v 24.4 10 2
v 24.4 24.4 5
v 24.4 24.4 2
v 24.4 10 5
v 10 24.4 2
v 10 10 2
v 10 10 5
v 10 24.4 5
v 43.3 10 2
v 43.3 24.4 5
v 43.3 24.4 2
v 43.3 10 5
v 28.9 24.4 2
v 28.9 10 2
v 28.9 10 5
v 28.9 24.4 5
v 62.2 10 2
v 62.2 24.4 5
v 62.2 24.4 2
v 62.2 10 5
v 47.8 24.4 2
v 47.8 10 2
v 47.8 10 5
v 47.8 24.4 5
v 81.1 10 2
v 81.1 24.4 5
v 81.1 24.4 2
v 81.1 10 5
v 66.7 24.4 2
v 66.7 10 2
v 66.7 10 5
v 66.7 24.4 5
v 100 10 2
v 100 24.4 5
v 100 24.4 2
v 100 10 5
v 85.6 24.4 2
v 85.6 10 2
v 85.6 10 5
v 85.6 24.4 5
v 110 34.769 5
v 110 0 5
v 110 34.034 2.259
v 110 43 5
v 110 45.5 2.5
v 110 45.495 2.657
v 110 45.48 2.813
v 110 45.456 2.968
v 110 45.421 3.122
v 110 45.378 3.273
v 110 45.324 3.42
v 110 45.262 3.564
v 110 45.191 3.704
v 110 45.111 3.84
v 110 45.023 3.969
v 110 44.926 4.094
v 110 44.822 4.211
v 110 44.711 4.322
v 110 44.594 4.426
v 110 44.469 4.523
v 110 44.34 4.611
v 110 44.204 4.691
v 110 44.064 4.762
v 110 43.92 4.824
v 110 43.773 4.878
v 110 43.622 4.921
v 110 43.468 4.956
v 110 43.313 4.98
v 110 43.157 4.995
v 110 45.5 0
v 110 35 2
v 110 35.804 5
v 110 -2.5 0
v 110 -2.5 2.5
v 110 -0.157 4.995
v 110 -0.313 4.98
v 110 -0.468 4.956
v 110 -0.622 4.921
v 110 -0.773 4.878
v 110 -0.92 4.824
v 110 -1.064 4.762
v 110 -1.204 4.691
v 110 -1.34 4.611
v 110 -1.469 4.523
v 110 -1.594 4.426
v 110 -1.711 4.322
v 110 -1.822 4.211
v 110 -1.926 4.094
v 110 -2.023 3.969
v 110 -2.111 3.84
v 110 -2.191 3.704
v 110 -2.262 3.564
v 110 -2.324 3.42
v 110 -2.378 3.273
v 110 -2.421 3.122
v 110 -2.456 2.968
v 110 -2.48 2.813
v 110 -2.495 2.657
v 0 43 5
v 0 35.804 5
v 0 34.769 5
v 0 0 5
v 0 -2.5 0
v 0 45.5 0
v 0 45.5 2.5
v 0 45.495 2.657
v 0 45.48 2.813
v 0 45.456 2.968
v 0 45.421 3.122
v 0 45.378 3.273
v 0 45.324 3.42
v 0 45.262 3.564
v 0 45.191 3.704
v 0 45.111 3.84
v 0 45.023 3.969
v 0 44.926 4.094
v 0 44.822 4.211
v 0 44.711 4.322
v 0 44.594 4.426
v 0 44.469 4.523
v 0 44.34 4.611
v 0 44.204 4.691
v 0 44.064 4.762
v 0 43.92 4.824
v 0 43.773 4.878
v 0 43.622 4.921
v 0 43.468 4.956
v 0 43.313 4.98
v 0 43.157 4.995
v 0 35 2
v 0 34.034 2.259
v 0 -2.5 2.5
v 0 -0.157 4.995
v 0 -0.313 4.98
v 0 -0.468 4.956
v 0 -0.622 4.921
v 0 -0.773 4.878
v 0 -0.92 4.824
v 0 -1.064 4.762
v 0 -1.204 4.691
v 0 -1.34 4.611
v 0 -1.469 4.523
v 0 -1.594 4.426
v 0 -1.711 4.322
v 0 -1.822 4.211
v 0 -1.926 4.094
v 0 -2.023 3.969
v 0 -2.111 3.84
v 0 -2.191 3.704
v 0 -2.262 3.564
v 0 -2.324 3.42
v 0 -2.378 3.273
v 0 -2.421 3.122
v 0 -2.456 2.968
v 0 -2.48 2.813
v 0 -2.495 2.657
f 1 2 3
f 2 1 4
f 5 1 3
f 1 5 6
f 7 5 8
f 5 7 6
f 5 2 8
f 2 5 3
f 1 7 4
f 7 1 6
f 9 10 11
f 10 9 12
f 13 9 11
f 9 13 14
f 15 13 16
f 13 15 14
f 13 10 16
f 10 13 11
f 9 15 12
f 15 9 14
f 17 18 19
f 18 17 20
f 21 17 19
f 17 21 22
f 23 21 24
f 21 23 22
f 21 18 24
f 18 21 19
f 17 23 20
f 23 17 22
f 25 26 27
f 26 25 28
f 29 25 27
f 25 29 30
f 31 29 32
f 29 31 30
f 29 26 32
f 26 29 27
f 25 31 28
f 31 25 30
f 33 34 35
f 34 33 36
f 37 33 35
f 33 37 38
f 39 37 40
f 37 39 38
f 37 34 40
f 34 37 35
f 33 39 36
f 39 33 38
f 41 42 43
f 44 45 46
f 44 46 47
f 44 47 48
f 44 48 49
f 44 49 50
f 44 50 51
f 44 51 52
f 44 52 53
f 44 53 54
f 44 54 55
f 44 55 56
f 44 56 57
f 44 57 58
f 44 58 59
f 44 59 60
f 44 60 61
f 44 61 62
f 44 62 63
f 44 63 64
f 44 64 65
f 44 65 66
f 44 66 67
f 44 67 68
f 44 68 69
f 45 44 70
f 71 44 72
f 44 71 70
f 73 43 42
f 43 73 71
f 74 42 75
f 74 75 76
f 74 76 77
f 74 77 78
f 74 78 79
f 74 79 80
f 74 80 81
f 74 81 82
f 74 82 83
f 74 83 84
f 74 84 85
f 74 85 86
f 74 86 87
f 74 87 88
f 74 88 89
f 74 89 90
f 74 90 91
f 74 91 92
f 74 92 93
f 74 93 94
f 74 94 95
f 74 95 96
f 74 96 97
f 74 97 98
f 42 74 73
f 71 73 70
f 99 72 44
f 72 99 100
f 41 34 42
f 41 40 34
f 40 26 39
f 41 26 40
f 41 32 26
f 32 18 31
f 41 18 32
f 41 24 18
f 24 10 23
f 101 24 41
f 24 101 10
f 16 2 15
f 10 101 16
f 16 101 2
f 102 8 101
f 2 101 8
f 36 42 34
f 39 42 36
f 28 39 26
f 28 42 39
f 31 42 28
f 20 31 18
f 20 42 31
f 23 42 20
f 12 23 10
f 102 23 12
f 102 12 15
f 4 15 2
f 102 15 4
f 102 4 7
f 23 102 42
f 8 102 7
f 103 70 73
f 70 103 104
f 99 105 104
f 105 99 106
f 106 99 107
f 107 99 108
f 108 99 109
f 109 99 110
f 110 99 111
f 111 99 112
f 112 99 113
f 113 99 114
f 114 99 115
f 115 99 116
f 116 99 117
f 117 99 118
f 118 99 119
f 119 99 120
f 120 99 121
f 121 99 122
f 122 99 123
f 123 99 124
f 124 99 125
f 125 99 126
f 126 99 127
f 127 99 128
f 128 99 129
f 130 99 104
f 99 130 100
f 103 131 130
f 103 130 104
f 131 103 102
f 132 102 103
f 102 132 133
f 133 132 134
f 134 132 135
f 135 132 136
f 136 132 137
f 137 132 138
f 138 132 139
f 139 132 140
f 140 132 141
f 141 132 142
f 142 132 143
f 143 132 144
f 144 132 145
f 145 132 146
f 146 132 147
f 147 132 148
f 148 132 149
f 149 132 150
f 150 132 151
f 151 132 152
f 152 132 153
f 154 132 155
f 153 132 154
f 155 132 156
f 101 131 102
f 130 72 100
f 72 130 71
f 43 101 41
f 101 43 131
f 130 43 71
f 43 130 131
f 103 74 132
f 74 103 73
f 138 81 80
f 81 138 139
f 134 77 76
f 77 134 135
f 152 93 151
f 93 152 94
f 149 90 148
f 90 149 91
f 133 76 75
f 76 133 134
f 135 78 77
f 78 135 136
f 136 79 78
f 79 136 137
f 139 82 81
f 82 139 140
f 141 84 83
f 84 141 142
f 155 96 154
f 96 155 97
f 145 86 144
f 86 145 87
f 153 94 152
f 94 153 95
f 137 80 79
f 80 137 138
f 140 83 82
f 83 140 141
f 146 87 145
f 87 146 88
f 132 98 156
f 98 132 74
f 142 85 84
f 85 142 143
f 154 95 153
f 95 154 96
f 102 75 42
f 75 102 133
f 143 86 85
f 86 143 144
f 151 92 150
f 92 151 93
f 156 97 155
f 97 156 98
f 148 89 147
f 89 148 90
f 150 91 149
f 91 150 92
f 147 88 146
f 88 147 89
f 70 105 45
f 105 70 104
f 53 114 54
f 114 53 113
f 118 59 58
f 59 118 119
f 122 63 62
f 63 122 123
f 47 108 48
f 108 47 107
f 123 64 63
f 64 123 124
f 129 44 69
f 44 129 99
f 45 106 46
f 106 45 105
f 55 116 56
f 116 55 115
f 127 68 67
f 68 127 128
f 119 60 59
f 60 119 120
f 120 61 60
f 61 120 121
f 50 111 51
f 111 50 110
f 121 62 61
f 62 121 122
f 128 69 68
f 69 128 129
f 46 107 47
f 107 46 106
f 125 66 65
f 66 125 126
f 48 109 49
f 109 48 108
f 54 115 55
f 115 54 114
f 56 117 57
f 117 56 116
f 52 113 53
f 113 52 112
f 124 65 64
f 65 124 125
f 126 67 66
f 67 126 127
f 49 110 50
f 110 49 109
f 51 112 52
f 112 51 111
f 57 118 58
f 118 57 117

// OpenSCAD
// Number of dice holes
// 4 for regular Pandemic: The Cure
// 5 for Experimental Meds
holes = 5;

card_width = 22*holes;

card_height = 43;

die_size = 13.9;
die_buffer = 0.25;

depth = 5;

hole_size = die_size + (die_buffer * 2);

outside_border = 10;
buffer = (card_width - (outside_border * 2) - (hole_size * holes)) / (holes-1);

$fn = 100;

union() {
    difference() {
        cube([card_width, card_height, depth]);
        for (i = [0:(holes-1)]) {
            translate([outside_border + ((hole_size + buffer) * i), 10, 2])
                cube([hole_size, hole_size, depth]);
        }
        translate([-0.5, 35, 2])
            rotate([75, 0, 0])
                cube([card_width + 1, card_height, 1]);    
    }

    // Bevel
    union() {
        translate([0,-depth/2,0])
            cube([card_width, depth/2, depth/2]);
        translate([card_width/2,0,depth/2])
            rotate([0, 90, 0])
                cylinder(card_width, depth/2, depth/2, true);

        translate([0,card_height,0])
            cube([card_width, depth/2, depth/2]);
        translate([card_width/2,card_height,depth/2])
            rotate([0, 90, 0])
                cylinder(card_width, depth/2, depth/2, true);
    }
}
